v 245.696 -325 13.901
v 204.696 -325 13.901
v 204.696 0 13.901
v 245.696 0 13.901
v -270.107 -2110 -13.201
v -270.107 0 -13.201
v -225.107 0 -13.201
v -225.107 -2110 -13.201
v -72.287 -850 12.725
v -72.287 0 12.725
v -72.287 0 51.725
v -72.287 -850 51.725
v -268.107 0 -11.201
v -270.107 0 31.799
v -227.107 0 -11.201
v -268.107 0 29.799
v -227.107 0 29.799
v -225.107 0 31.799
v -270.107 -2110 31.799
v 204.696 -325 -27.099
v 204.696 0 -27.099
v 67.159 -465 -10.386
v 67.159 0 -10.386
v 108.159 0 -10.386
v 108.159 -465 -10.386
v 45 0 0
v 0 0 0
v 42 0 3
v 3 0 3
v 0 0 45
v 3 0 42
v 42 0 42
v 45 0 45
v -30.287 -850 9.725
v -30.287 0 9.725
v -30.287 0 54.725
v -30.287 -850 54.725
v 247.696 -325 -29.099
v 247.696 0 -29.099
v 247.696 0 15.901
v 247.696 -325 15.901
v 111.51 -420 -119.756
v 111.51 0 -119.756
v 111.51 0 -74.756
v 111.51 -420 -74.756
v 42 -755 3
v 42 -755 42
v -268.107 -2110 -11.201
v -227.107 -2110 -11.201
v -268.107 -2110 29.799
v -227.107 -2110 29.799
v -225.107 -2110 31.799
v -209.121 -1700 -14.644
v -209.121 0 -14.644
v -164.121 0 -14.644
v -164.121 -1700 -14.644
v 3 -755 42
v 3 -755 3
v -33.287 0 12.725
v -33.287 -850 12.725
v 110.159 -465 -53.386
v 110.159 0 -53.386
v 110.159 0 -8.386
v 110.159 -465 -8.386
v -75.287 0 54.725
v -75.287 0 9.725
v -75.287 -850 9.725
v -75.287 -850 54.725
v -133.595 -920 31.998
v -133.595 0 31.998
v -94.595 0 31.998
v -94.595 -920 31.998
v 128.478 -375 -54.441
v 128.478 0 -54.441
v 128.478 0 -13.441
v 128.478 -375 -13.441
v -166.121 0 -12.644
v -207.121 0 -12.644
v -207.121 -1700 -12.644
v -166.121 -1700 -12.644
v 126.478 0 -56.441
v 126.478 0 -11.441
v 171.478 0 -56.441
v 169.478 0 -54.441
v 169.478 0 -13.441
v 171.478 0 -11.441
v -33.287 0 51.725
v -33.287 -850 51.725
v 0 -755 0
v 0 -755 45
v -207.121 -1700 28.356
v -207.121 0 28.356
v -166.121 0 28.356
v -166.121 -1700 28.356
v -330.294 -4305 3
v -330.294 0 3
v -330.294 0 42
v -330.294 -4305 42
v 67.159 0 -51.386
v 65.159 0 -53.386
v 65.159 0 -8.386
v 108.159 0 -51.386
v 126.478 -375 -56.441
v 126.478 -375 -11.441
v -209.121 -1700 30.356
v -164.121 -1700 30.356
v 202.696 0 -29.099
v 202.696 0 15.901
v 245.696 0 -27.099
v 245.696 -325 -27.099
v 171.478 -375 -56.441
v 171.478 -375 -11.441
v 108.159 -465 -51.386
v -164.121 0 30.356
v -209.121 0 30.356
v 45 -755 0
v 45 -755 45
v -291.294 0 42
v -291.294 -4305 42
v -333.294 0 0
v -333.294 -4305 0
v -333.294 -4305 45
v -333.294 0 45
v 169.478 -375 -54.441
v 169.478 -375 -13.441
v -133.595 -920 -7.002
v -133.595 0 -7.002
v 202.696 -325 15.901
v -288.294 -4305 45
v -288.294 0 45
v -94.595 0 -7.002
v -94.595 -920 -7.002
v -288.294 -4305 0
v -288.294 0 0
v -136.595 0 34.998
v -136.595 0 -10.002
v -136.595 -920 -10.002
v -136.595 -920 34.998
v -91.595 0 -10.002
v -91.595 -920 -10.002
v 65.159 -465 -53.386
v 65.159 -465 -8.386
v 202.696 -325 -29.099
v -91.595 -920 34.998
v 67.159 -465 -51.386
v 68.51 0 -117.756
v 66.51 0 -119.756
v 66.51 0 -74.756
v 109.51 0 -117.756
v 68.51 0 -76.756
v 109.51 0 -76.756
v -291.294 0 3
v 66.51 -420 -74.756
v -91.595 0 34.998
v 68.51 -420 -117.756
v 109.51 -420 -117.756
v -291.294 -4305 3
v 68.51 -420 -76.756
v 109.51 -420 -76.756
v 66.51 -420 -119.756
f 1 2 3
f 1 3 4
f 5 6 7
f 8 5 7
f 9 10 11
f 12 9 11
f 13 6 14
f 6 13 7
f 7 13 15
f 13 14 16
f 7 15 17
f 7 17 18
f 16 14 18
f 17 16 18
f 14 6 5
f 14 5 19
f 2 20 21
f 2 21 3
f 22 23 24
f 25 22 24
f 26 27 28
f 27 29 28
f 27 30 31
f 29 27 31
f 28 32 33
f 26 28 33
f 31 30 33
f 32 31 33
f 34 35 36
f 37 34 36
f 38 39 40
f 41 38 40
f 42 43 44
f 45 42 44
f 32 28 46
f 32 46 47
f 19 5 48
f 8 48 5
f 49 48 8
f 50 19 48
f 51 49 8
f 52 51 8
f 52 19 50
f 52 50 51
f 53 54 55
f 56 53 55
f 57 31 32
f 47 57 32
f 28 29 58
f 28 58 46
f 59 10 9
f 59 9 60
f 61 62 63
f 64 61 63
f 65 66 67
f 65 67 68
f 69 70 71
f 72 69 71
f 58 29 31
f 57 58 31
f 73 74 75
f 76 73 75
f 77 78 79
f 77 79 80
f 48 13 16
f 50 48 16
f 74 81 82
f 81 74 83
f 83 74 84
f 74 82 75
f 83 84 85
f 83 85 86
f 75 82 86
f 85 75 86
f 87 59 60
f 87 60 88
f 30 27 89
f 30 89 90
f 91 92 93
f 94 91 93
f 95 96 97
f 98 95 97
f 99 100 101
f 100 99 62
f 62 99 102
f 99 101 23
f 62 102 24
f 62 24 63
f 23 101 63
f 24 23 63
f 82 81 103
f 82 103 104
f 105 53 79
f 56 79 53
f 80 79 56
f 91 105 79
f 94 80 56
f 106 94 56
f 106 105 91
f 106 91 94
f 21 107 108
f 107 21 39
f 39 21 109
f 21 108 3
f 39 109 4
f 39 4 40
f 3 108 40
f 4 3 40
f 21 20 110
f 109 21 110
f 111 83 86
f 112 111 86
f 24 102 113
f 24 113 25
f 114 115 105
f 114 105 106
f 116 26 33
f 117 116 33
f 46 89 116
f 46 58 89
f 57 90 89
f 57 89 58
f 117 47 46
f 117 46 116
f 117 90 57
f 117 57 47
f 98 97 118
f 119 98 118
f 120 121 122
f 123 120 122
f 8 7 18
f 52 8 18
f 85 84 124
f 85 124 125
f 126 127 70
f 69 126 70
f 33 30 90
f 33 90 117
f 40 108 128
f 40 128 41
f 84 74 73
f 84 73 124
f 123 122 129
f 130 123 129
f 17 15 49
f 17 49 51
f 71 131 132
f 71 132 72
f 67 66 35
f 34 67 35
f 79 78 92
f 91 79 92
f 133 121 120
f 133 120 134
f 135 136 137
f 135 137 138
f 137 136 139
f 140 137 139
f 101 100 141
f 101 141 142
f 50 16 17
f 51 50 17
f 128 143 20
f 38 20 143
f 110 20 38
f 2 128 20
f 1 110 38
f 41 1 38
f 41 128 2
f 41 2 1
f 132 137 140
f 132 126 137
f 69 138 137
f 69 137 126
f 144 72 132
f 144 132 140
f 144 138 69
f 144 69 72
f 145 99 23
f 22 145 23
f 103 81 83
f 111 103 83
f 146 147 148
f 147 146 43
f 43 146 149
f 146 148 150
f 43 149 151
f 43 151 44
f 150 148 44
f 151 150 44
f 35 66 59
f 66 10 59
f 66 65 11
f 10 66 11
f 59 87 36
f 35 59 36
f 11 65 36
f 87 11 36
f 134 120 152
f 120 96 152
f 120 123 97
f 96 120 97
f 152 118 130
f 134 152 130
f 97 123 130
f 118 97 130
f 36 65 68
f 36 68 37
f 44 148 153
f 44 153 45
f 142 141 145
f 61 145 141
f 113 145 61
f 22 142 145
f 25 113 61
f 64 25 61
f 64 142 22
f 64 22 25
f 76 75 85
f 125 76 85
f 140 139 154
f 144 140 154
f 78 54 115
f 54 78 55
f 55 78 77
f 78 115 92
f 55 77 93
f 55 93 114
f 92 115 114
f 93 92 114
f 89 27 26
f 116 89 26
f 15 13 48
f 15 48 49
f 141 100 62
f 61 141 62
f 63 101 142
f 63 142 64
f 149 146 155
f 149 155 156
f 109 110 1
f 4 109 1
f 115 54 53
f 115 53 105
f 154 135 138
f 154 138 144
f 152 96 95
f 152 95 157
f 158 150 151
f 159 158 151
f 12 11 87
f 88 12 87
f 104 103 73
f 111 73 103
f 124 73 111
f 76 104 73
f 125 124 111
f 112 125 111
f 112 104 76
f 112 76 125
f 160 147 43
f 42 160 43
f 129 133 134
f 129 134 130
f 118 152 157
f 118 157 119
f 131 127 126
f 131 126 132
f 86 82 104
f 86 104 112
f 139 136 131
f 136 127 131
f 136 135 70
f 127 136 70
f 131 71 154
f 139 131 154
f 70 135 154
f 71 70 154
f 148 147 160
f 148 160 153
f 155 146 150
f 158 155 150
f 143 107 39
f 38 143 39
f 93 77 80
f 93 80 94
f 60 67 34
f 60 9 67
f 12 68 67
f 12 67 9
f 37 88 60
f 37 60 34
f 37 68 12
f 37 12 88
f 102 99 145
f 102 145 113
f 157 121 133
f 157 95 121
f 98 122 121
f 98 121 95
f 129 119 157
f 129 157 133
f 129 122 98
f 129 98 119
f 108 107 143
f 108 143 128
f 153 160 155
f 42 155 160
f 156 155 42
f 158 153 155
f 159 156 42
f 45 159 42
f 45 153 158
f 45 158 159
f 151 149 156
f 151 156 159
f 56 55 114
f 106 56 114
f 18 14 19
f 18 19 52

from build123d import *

# Parameters (mm, degrees)
F0_W      = 45
F0_H      = 45
F0_W_2    = 39
F0_H_2    = 39
F1_DEPTH  = 755
F2_DEPTH  = 850
F3_DEPTH  = 920
F0_W_3    = 41
F0_H_3    = 41
F4_DEPTH  = 1700
F5_DEPTH  = 2110
F6_DEPTH  = 465
F7_DEPTH  = 375
F8_DEPTH  = 4305
F9_DEPTH  = 325
F10_DEPTH = 420


with BuildPart() as f1:
    # F0 (on Front) → F1 (new body)
    with BuildSketch(Plane.XZ):
        with Locations((22.5, 22.5)):
            Rectangle(F0_W, F0_H)
        with Locations((22.5, 22.5)):
            Rectangle(F0_W_2, F0_H_2, mode=Mode.SUBTRACT)
    extrude(amount=F1_DEPTH)


with BuildPart() as f2:
    # F0 (on Front) → F2 (new body)
    with BuildSketch(Plane.XZ):
        with Locations((-52.787446, 32.224624)):
            Rectangle(F0_W, F0_H)
        with Locations((-52.787446, 32.224624)):
            Rectangle(F0_W_2, F0_H_2, mode=Mode.SUBTRACT)
    extrude(amount=F2_DEPTH)


with BuildPart() as f3:
    # F0 (on Front) → F3 (new body)
    with BuildSketch(Plane.XZ):
        with Locations((-114.095398, 12.497777)):
            Rectangle(F0_W, F0_H)
        with Locations((-114.095398, 12.497777)):
            Rectangle(F0_W_2, F0_H_2, mode=Mode.SUBTRACT)
    extrude(amount=F3_DEPTH)


with BuildPart() as f4:
    # F0 (on Front) → F4 (new body)
    with BuildSketch(Plane.XZ):
        with Locations((-186.620572, 7.856163)):
            Rectangle(F0_W, F0_H)
        with Locations((-186.620572, 7.856163)):
            Rectangle(F0_W_3, F0_H_3, mode=Mode.SUBTRACT)
    extrude(amount=F4_DEPTH)


with BuildPart() as f5:
    # F0 (on Front) → F5 (new body)
    with BuildSketch(Plane.XZ):
        with Locations((-247.606673, 9.299338)):
            Rectangle(F0_W, F0_H)
        with Locations((-247.606673, 9.299338)):
            Rectangle(F0_W_3, F0_H_3, mode=Mode.SUBTRACT)
    extrude(amount=F5_DEPTH)


with BuildPart() as f6:
    # F0 (on Front) → F6 (new body)
    with BuildSketch(Plane.XZ):
        with Locations((87.659239, -30.886372)):
            Rectangle(F0_W, F0_H)
        with Locations((87.659239, -30.886372)):
            Rectangle(F0_W_3, F0_H_3, mode=Mode.SUBTRACT)
    extrude(amount=F6_DEPTH)


with BuildPart() as f7:
    # F0 (on Front) → F7 (new body)
    with BuildSketch(Plane.XZ):
        with Locations((148.977748, -33.940547)):
            Rectangle(F0_W, F0_H)
        with Locations((148.977748, -33.940547)):
            Rectangle(F0_W_3, F0_H_3, mode=Mode.SUBTRACT)
    extrude(amount=F7_DEPTH)


with BuildPart() as f8:
    # F0 (on Front) → F8 (new body)
    with BuildSketch(Plane.XZ):
        with Locations((-310.793617, 22.5)):
            Rectangle(F0_W, F0_H)
        with Locations((-310.793617, 22.5)):
            Rectangle(F0_W_2, F0_H_2, mode=Mode.SUBTRACT)
    extrude(amount=F8_DEPTH)


with BuildPart() as f9:
    # F0 (on Front) → F9 (new body)
    with BuildSketch(Plane.XZ):
        with Locations((225.195891, -6.599107)):
            Rectangle(F0_W, F0_H)
        with Locations((225.195891, -6.599107)):
            Rectangle(F0_W_3, F0_H_3, mode=Mode.SUBTRACT)
    extrude(amount=F9_DEPTH)


with BuildPart() as f10:
    # F0 (on Front) → F10 (new body)
    with BuildSketch(Plane.XZ):
        with Locations((89.010312, -97.255574)):
            Rectangle(F0_W, F0_H)
        with Locations((89.010312, -97.255574)):
            Rectangle(F0_W_3, F0_H_3, mode=Mode.SUBTRACT)
    extrude(amount=F10_DEPTH)


solid = Compound([f1.part, f2.part, f3.part, f4.part, f5.part, f6.part, f7.part, f8.part, f9.part, f10.part])
